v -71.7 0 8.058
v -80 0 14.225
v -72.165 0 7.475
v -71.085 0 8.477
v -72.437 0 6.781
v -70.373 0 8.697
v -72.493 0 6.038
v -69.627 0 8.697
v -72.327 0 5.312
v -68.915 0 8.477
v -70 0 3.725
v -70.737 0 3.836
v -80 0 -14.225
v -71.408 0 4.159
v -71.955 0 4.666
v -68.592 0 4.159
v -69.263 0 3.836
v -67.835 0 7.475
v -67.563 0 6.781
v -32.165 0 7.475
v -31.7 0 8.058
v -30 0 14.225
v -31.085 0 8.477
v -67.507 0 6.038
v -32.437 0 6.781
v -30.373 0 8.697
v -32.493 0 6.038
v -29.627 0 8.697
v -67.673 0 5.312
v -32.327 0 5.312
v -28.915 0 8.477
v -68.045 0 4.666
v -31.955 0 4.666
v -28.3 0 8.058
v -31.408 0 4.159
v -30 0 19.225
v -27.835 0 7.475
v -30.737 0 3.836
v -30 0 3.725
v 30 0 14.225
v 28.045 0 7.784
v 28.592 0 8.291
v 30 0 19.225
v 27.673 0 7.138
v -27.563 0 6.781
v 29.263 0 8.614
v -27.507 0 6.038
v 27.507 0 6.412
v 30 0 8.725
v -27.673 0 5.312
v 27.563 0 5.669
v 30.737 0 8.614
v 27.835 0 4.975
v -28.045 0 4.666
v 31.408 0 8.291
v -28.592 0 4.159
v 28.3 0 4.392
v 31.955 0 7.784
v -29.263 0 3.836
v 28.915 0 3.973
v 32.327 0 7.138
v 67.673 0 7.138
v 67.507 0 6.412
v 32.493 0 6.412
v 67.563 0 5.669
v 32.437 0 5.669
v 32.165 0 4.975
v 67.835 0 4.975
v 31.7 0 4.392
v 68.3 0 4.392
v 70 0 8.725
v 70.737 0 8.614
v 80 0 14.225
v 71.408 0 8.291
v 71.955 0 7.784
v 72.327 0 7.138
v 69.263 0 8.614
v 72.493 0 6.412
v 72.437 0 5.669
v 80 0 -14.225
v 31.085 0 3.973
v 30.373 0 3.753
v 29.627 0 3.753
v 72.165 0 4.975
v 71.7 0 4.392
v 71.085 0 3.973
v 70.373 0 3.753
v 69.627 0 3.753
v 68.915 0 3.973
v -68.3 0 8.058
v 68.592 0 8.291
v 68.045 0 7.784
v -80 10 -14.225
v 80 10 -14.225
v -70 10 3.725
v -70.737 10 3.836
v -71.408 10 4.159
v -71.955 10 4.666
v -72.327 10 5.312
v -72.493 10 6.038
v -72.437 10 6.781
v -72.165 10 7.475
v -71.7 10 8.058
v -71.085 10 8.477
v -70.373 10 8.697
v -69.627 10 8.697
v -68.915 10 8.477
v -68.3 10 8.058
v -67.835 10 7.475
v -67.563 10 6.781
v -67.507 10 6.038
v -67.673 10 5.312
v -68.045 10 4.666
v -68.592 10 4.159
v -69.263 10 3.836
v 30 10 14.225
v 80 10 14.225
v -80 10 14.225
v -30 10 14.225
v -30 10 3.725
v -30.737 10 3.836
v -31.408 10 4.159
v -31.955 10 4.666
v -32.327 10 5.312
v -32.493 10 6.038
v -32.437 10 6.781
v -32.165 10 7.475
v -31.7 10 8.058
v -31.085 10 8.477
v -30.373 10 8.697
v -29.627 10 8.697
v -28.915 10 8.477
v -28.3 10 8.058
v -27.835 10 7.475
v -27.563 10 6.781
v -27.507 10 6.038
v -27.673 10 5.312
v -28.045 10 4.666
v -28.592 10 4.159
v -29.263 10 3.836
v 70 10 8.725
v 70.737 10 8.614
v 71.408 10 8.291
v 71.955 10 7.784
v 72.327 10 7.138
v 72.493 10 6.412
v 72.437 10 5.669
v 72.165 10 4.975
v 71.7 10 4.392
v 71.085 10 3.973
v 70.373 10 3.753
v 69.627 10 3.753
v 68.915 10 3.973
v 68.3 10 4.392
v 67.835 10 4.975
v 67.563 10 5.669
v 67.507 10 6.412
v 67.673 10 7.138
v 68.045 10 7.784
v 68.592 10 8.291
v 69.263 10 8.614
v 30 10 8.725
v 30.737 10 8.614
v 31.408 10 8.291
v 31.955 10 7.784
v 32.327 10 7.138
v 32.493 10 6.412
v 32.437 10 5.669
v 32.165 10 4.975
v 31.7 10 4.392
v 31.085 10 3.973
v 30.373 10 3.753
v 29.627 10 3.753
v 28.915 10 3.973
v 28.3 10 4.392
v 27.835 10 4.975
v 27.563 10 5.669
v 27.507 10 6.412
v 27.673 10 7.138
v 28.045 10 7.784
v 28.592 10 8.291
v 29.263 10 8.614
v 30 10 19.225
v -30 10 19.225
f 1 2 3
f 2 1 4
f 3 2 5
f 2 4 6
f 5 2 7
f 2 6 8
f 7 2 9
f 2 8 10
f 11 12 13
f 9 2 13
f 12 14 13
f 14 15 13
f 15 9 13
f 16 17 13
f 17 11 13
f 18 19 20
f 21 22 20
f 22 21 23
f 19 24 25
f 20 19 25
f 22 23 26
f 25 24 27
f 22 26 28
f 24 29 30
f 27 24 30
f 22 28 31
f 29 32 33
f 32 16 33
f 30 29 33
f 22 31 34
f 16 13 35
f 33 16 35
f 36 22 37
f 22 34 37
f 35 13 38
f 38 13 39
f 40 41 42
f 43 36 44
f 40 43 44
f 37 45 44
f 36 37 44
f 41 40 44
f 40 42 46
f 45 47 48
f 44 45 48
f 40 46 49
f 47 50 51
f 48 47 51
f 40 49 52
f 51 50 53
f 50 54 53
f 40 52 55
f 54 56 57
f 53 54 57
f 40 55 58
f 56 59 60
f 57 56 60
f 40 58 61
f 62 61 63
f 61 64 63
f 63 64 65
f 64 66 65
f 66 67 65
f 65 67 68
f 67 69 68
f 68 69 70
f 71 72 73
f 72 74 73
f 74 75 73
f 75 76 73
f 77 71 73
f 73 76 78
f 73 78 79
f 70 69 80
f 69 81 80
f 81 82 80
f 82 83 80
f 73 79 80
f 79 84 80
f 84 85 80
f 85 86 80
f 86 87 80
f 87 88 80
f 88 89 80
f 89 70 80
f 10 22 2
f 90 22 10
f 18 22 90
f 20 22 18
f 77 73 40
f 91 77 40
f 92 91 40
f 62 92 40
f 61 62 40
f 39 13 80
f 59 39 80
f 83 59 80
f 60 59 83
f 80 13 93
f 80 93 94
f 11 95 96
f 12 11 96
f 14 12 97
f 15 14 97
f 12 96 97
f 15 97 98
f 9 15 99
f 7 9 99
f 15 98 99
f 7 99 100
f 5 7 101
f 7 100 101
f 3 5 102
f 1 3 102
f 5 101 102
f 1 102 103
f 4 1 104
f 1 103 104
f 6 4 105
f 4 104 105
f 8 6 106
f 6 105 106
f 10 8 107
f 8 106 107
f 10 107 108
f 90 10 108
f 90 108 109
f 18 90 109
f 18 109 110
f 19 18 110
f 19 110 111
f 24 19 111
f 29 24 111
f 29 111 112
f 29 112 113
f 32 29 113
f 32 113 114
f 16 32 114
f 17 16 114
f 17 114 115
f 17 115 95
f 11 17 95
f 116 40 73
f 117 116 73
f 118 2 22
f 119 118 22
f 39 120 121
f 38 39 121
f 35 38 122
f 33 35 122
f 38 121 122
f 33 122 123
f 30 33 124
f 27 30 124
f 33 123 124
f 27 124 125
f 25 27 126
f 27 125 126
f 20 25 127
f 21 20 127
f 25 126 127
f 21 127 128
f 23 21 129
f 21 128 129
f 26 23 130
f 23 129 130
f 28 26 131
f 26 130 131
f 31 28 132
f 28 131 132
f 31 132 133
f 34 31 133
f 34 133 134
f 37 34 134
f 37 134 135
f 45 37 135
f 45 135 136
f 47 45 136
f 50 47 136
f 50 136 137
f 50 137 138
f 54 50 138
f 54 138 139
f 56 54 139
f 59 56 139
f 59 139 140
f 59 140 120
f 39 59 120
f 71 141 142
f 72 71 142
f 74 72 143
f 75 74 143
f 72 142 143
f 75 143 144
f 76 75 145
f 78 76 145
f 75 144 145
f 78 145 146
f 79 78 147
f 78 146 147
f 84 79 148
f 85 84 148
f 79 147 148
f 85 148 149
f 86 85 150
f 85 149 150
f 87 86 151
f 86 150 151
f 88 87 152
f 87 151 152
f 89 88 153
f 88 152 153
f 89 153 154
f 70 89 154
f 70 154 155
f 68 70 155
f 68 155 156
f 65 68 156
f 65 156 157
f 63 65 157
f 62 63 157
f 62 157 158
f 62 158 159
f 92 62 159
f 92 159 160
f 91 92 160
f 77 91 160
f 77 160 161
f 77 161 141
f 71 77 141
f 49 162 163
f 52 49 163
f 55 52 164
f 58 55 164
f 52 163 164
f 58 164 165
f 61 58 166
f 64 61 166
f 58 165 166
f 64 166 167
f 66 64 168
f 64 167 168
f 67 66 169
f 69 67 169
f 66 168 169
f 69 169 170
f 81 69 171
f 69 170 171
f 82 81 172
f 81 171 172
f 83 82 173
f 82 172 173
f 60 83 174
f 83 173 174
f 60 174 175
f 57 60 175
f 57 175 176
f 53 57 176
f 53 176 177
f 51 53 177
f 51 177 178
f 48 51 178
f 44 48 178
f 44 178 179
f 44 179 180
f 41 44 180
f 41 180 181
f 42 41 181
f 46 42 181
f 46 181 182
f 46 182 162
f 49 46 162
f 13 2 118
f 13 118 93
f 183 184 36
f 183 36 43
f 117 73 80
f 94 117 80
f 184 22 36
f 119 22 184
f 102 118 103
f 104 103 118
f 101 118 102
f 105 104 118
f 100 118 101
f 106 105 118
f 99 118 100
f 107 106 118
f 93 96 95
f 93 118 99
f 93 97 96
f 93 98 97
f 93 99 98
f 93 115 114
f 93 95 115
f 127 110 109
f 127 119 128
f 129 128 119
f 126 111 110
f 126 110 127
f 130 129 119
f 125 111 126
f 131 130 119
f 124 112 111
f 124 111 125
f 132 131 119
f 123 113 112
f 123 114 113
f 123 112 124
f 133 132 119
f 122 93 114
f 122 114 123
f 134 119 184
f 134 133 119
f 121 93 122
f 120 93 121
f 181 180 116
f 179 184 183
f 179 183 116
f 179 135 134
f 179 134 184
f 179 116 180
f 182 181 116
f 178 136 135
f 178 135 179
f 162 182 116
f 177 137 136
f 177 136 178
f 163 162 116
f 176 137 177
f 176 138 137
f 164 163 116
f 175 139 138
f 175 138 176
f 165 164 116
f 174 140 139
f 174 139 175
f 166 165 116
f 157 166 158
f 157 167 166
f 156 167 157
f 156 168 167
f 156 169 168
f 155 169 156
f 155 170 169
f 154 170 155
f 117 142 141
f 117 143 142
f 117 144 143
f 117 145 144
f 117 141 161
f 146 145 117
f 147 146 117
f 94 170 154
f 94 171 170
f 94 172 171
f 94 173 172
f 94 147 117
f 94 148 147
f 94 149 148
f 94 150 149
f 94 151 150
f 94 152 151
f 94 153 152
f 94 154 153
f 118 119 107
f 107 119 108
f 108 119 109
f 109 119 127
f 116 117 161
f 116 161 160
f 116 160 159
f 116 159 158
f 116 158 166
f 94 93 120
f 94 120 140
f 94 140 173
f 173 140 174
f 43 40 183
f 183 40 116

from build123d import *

# Parameters (mm, degrees)
SKETCH2_W           = 160
SKETCH2_H           = 28.45
BOSS_EXTRUDE1_DEPTH = 10
SKETCH4_W           = 60
SKETCH4_H           = 10
BOSS_EXTRUDE2_DEPTH = 5
SKETCH5_R           = 2.5
CUT_EXTRUDE1_DEPTH  = 83.883053907


with BuildPart() as part:
    # Sketch2 → Boss-Extrude1 (new body)
    with BuildSketch(Plane(origin=(0, 0, 0), x_dir=(1, 0, 0), z_dir=(0, 1, 0))):
        Rectangle(SKETCH2_W, SKETCH2_H)
    extrude(amount=BOSS_EXTRUDE1_DEPTH)

    # Sketch4 → Boss-Extrude2 (add)
    with BuildSketch(Plane.XY.offset(14.225)):
        with Locations((0, 5)):
            Rectangle(SKETCH4_W, SKETCH4_H)
    extrude(amount=BOSS_EXTRUDE2_DEPTH)

    # Sketch5 → Cut-Extrude1 (cut, through all)
    with BuildSketch(Plane(origin=(0, 10, 0), x_dir=(1, 0, 0), z_dir=(0, 1, 0))):
        with Locations(Location((70, -6.225, 0), (0, 0, 270))):
            Circle(SKETCH5_R)
        with Locations(Location((30, -6.225, 0), (0, 0, 270))):
            Circle(SKETCH5_R)
        with Locations(Location((-30, -6.225, 0), (0, 0, 90))):
            Circle(SKETCH5_R)
        with Locations(Location((-70, -6.225, 0), (0, 0, 90))):
            Circle(SKETCH5_R)
    extrude(amount=-CUT_EXTRUDE1_DEPTH, mode=Mode.SUBTRACT)


solid = part.part
